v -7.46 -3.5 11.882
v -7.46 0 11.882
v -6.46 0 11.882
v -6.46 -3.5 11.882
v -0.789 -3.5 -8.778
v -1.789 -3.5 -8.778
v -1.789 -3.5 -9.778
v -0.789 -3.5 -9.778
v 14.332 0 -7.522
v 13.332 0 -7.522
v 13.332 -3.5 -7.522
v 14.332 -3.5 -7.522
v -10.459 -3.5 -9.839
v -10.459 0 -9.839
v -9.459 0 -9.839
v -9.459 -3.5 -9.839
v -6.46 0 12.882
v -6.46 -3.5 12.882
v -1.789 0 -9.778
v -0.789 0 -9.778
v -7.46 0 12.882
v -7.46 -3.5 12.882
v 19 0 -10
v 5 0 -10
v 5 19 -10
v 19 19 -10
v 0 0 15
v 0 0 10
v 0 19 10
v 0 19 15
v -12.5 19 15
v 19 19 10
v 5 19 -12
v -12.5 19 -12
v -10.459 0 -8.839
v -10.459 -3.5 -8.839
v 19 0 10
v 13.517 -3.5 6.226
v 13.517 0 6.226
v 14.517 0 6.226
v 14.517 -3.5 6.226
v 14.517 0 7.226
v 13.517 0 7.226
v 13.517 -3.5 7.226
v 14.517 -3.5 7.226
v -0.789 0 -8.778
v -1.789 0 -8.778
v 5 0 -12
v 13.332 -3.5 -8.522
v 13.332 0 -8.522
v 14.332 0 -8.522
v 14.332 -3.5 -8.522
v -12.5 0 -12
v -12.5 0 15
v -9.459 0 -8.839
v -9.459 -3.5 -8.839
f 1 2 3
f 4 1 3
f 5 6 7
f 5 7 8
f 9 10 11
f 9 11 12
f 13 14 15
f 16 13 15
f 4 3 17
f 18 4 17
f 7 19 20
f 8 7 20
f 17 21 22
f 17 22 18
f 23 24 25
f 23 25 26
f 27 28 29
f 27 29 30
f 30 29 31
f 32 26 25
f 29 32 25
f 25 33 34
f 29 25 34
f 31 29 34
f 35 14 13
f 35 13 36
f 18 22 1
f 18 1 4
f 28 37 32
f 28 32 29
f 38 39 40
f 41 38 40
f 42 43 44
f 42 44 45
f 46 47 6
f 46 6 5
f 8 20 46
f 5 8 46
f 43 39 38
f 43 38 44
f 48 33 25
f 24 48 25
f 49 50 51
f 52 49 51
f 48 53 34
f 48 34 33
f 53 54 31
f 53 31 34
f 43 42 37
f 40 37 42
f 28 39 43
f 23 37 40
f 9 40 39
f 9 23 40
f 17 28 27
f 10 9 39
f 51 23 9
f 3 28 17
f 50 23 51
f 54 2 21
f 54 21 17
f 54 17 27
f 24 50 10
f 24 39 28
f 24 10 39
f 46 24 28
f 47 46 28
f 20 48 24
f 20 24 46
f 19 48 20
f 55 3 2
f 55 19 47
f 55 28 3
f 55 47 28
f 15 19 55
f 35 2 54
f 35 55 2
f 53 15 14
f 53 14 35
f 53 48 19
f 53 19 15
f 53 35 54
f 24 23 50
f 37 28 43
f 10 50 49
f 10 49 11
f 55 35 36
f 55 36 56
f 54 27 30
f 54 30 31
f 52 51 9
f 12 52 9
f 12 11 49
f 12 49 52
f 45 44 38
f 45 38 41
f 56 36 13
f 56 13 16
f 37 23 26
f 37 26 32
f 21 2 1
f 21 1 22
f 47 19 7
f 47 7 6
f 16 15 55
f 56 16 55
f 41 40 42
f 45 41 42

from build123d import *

# Parameters (mm, degrees)
EXTRUDE_1_DEPTH = 19
SKETCH_2_W      = 1
SKETCH_2_H      = 1
EXTRUDE_2_DEPTH = 3.5


with BuildPart() as part:
    # 草图1 → 拉伸1 (new body)
    with BuildSketch(Plane(origin=(0, 0, 0), x_dir=(1, 0, 0), z_dir=(0, 1, 0))):
        Polygon((5, 10), (19, 10), (19, -10), (0, -10), (0, -15), (-12.5, -15), (-12.5, 12), (5, 12), align=None)
    extrude(amount=EXTRUDE_1_DEPTH)

    # 草图2 → 拉伸2 (add)
    with BuildSketch(Plane.XZ):
        with Locations((13.831603364, -8.022376545)):
            Rectangle(SKETCH_2_W, SKETCH_2_H)
        with Locations((14.016943938, 6.726433021)):
            Rectangle(SKETCH_2_W, SKETCH_2_H)
        with Locations((-6.96, 12.382327248)):
            Rectangle(SKETCH_2_W, SKETCH_2_H)
        with Locations((-1.289220796, -9.277739781)):
            Rectangle(SKETCH_2_W, SKETCH_2_H)
        with Locations((-9.959378068, -9.338614045)):
            Rectangle(SKETCH_2_W, SKETCH_2_H)
    extrude(amount=EXTRUDE_2_DEPTH)


solid = part.part
